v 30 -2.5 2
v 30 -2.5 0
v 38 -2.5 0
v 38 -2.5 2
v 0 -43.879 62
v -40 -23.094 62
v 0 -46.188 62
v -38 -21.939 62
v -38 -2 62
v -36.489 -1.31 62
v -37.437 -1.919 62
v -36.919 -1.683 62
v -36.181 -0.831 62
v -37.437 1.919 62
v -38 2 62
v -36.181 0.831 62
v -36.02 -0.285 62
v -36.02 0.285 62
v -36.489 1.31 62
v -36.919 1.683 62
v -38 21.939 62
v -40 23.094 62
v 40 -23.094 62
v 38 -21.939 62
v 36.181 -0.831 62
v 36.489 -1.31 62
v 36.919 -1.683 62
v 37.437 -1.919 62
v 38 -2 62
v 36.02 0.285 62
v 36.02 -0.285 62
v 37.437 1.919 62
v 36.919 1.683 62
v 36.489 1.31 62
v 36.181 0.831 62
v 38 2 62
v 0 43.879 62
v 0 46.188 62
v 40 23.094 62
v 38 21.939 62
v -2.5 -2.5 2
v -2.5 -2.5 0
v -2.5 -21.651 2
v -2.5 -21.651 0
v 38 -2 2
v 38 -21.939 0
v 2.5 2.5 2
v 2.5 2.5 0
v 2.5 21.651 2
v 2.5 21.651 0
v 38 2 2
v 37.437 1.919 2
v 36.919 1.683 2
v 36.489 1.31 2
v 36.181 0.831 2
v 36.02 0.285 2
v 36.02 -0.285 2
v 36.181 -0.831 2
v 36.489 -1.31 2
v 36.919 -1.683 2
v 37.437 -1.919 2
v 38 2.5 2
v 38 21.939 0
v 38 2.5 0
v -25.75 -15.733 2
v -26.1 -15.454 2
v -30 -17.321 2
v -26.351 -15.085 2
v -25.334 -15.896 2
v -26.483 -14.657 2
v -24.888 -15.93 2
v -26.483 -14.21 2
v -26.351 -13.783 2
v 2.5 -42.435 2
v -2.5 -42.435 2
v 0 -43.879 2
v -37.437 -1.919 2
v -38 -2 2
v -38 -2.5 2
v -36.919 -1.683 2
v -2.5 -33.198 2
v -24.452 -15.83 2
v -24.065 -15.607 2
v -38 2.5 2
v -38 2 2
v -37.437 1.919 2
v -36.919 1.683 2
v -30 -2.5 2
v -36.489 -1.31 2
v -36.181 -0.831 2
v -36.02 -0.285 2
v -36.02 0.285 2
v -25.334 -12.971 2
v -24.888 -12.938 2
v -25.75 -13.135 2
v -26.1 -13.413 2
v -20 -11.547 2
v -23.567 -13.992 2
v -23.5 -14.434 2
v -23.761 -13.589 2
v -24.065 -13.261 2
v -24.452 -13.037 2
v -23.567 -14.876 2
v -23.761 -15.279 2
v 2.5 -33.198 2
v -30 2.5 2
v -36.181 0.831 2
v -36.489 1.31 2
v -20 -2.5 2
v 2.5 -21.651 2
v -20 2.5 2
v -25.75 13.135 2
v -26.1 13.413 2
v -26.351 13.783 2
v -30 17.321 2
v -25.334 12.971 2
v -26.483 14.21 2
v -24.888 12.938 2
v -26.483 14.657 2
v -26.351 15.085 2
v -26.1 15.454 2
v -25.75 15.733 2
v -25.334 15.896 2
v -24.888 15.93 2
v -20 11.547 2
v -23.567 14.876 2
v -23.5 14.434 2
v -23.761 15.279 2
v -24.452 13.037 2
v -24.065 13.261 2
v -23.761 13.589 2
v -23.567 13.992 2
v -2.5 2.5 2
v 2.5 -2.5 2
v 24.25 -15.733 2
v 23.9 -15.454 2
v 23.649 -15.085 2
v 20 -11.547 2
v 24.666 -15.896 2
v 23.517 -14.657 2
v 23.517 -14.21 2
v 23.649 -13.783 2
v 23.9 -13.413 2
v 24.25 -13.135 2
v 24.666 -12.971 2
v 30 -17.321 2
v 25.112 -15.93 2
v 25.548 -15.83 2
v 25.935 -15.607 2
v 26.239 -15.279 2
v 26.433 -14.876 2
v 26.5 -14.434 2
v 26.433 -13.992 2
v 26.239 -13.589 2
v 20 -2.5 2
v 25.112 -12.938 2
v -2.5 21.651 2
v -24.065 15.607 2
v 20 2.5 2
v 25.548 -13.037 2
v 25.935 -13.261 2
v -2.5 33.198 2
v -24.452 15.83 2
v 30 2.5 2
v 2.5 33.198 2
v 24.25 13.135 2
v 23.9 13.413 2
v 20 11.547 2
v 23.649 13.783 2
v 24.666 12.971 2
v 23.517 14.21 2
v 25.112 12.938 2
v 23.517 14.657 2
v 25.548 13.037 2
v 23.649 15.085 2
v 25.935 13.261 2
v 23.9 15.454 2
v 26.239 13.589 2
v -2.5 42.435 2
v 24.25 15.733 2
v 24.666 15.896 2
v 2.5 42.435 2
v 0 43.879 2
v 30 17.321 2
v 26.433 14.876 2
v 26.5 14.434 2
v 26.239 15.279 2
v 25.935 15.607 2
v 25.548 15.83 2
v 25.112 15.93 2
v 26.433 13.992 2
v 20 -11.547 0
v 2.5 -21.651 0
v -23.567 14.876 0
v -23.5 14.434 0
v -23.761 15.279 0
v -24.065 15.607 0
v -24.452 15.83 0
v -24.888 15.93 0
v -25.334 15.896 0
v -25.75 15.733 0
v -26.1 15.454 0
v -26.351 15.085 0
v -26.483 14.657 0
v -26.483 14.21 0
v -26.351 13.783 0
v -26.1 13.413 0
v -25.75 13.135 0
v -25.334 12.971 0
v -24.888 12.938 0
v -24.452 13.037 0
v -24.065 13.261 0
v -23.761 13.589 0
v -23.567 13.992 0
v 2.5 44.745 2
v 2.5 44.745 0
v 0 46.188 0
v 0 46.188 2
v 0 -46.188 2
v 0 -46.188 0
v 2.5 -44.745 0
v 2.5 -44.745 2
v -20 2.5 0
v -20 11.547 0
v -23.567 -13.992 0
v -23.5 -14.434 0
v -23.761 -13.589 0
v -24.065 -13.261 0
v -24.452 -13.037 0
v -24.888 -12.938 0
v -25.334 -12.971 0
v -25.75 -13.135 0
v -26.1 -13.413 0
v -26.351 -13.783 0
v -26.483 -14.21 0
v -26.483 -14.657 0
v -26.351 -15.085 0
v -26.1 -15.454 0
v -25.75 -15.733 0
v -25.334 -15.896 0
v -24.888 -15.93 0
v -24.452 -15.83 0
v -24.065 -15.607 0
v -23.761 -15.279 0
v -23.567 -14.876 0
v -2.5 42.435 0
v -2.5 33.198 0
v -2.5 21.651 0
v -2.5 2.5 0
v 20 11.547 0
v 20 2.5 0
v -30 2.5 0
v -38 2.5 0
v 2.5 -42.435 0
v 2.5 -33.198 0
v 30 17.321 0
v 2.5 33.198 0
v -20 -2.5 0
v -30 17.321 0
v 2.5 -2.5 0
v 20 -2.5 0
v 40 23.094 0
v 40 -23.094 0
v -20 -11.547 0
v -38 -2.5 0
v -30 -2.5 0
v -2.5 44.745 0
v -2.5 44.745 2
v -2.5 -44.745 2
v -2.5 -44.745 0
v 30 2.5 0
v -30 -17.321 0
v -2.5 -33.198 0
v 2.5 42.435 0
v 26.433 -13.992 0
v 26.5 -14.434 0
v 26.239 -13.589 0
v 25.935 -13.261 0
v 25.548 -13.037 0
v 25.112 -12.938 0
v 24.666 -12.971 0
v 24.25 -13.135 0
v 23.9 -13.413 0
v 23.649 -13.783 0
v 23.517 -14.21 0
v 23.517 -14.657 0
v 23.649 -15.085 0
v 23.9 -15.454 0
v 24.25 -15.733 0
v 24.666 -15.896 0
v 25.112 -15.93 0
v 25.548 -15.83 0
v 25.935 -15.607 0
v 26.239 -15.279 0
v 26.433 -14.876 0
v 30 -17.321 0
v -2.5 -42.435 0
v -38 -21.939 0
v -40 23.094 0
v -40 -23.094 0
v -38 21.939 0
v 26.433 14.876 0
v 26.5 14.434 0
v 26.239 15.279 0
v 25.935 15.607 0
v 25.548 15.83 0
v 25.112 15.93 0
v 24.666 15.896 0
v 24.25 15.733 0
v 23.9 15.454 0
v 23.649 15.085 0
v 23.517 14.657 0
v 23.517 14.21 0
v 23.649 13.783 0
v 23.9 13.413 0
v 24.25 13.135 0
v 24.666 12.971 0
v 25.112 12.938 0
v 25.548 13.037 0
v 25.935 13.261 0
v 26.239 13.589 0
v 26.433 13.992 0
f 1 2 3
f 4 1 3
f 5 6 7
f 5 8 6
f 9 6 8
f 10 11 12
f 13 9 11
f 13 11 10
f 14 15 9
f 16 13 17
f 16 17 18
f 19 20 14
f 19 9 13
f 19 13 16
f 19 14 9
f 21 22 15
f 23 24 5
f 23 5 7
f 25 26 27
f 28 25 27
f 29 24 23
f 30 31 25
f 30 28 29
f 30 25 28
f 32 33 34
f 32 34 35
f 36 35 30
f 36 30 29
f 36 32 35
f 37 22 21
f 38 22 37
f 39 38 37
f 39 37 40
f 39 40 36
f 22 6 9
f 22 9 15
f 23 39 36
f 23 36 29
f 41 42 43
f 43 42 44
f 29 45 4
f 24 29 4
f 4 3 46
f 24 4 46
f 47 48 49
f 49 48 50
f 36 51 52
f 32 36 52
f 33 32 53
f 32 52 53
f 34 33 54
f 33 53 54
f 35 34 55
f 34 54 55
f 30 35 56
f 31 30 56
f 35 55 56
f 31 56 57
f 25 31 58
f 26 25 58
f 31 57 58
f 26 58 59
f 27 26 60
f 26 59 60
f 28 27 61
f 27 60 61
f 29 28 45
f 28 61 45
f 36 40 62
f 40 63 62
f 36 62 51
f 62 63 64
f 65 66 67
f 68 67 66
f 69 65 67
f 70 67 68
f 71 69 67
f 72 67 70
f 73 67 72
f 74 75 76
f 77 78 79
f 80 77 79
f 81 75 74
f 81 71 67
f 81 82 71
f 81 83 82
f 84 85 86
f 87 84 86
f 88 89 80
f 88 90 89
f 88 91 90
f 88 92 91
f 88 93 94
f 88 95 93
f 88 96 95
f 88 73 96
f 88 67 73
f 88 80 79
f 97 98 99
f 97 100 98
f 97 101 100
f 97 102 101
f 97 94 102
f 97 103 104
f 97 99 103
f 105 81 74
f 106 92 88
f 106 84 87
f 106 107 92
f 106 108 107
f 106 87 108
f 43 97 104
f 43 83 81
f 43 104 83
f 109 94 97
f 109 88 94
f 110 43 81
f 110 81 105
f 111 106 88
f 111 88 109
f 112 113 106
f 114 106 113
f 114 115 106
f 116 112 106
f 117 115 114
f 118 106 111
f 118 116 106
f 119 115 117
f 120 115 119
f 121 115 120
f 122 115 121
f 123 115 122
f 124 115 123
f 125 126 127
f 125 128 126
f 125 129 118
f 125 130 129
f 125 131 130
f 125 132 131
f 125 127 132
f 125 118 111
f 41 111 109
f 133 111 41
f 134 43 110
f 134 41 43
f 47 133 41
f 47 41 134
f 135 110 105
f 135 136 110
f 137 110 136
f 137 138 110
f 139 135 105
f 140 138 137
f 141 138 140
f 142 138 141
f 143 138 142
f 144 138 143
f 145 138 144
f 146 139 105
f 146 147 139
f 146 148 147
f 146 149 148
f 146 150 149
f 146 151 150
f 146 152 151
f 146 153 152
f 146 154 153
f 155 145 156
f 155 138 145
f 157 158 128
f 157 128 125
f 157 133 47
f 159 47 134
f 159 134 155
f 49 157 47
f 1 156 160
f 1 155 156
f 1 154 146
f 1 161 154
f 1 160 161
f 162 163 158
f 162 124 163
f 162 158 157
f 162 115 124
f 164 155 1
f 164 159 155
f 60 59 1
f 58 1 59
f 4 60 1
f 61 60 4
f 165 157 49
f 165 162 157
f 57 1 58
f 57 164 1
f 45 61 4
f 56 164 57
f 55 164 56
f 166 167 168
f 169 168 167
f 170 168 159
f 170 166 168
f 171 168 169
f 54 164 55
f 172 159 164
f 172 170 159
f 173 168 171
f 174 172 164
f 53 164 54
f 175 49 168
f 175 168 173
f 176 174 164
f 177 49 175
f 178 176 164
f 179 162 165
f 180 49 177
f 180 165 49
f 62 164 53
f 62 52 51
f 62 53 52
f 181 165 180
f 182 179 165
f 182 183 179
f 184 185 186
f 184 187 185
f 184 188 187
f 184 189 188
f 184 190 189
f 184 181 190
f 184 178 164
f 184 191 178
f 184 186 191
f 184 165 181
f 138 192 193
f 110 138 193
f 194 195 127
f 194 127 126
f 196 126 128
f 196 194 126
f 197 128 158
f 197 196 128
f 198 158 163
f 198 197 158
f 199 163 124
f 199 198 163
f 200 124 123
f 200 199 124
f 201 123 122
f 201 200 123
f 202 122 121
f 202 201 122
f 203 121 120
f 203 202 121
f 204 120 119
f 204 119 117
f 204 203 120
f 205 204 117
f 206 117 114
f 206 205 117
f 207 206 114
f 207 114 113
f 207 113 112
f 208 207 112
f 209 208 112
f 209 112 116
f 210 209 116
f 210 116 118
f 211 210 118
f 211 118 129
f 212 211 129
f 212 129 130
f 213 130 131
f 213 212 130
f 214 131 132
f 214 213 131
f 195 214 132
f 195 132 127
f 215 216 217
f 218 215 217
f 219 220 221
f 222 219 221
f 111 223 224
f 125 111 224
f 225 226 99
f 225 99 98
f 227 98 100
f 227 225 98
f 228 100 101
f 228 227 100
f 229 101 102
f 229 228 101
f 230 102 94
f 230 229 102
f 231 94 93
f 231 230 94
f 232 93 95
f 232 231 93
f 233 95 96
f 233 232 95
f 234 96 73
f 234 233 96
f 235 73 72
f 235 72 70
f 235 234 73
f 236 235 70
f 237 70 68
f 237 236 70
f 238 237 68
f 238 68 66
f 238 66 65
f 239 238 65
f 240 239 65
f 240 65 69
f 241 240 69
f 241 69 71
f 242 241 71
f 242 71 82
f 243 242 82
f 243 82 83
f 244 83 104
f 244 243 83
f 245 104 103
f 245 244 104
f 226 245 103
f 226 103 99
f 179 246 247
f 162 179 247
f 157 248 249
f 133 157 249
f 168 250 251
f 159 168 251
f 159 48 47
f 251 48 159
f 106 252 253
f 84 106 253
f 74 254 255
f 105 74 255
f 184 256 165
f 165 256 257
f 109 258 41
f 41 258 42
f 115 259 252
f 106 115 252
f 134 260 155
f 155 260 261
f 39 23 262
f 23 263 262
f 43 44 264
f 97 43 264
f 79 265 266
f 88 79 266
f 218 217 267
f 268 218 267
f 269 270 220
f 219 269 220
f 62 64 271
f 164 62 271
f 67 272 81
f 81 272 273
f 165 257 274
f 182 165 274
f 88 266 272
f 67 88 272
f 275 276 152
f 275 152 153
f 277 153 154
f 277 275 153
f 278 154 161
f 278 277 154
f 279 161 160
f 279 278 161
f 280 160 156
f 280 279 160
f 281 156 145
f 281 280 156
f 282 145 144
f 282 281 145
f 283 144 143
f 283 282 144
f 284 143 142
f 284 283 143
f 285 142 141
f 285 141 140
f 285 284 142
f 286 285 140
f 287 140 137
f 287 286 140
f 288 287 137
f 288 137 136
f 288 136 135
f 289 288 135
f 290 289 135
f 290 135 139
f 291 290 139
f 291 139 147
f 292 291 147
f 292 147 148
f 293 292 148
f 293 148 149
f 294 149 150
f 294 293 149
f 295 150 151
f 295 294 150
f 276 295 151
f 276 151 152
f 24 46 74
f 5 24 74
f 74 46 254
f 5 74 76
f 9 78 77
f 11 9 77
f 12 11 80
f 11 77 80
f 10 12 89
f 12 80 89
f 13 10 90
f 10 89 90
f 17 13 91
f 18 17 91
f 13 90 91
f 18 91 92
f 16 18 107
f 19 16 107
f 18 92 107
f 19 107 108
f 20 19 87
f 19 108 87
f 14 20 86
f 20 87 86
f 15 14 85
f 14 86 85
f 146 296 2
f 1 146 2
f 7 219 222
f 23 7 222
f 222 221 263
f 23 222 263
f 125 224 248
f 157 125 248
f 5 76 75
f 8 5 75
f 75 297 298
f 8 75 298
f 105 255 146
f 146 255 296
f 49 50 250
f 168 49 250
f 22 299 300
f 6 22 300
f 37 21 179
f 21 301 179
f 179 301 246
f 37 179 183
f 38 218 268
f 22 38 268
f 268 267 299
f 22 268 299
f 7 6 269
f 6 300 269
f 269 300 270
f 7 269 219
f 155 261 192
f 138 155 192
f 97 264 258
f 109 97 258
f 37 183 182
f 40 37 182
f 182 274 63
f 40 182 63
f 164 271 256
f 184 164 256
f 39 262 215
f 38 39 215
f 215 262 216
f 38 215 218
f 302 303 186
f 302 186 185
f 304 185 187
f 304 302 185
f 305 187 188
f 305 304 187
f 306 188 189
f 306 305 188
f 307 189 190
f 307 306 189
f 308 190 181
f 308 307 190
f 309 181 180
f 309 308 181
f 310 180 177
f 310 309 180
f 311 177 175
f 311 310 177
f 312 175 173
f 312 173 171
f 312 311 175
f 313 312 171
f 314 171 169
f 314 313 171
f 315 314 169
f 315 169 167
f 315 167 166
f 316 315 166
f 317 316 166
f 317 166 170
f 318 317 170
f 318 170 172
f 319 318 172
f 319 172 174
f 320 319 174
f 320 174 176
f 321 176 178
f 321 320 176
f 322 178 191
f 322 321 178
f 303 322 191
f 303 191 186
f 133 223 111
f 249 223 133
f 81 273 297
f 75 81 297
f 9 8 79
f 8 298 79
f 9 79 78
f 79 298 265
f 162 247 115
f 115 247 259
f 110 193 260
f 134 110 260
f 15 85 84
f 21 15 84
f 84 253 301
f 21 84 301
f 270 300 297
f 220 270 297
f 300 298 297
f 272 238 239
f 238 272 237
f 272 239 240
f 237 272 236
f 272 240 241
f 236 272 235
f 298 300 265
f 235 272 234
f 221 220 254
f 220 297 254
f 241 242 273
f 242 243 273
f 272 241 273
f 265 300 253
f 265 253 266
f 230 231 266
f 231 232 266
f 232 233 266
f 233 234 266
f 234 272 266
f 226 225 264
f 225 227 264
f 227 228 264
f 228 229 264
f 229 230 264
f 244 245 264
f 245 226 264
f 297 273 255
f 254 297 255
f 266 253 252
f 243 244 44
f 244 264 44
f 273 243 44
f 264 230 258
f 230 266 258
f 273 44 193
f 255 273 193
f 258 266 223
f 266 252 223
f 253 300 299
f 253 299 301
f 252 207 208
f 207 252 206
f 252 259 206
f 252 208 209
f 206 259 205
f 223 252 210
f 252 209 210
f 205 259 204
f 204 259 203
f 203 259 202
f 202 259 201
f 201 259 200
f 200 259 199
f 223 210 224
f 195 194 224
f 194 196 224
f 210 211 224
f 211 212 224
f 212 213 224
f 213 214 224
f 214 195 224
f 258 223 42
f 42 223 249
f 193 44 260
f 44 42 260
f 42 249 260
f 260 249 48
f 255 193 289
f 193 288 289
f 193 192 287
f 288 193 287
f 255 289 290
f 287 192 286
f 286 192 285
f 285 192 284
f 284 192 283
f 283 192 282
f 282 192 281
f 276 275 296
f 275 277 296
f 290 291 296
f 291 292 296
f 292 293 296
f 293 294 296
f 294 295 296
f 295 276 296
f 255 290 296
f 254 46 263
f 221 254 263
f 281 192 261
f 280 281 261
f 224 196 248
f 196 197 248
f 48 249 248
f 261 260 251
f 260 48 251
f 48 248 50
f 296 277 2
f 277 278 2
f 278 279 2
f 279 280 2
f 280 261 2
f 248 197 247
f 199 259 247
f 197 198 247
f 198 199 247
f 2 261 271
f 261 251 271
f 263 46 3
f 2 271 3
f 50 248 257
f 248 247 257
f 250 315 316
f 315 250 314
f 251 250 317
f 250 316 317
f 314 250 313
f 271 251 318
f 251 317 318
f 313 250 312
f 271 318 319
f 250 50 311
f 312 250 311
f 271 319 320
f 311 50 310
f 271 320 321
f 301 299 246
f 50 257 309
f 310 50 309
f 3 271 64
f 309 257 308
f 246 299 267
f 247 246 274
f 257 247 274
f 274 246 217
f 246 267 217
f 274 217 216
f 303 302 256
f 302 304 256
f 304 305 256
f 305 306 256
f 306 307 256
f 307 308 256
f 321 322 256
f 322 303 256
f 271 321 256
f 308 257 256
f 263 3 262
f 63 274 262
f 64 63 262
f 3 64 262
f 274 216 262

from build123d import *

# Parameters (mm, degrees)
F0_R     = 1.5
F0_W     = 10
F0_H     = 5
F0_W_2   = 17.5
F0_W_3   = 5
F1_DEPTH = 2
F3_DEPTH = 60


with BuildPart() as f1:
    # F0 (on Top) → F1 (new body)
    with BuildSketch(Plane.XY):
        Polygon((0, -46.1880215352), (2.5, -44.7446458622), (-2.5, -44.7446458622), align=None)
        Polygon((-2.5, 44.7446458622), (2.5, 44.7446458622), (0, 46.1880215352), align=None)
        Polygon((-2.5, -44.7446458622), (2.5, -44.7446458622), (2.5, -42.4352447854), (0, -43.8786204584), (-2.5, -42.4352447854), align=None)
        Polygon((2.5, 42.4352447854), (2.5, 44.7446458622), (-2.5, 44.7446458622), (-2.5, 42.4352447854), (0, 43.8786204584), align=None)
        Polygon((40, -23.0940107676), (40, 23.0940107676), (2.5, 44.7446458622), (2.5, 42.4352447854), (38, 21.9393102292), (38, 2.5), (38, 2), (38, -2), (38, -2.5), (38, -21.9393102292), (2.5, -42.4352447854), (2.5, -44.7446458622), align=None)
        Polygon((-2.5, 42.4352447854), (-2.5, 44.7446458622), (-40, 23.0940107676), (-40, -23.0940107676), (-2.5, -44.7446458622), (-2.5, -42.4352447854), (-38, -21.9393102292), (-38, -2.5), (-38, -2), (-38, 2), (-38, 2.5), (-38, 21.9393102292), align=None)
        Polygon((-2.5, 21.6506350946), (-2.5, 33.1976404784), (-30, 17.3205080757), (-30, 2.5), (-20, 2.5), (-20, 11.5470053838), align=None)
        with Locations((-25, 14.4337567297)):
            Circle(F0_R, mode=Mode.SUBTRACT)
        Polygon((30, 17.3205080757), (2.5, 33.1976404784), (2.5, 21.6506350946), (20, 11.5470053838), (20, 2.5), (30, 2.5), align=None)
        with Locations((25, 14.4337567297)):
            Circle(F0_R, mode=Mode.SUBTRACT)
        Polygon((2.5, 21.6506350946), (2.5, 33.1976404784), (0, 34.6410161514), (-2.5, 33.1976404784), (-2.5, 21.6506350946), (0, 23.0940107676), align=None)
        Polygon((2.5, 33.1976404784), (2.5, 42.4352447854), (0, 43.8786204584), (-2.5, 42.4352447854), (-2.5, 33.1976404784), (0, 34.6410161514), align=None)
        Polygon((-30, -17.3205080757), (-2.5, -33.1976404784), (-2.5, -21.6506350946), (-20, -11.5470053838), (-20, -2.5), (-30, -2.5), align=None)
        with Locations((-25, -14.4337567297)):
            Circle(F0_R, mode=Mode.SUBTRACT)
        Polygon((0, -34.6410161514), (2.5, -33.1976404784), (2.5, -21.6506350946), (0, -23.0940107676), (-2.5, -21.6506350946), (-2.5, -33.1976404784), align=None)
        Polygon((2.5, -21.6506350946), (2.5, -33.1976404784), (30, -17.3205080757), (30, -2.5), (20, -2.5), (20, -11.5470053838), align=None)
        with Locations((25, -14.4337567297)):
            Circle(F0_R, mode=Mode.SUBTRACT)
        with Locations((25, 0)):
            Rectangle(F0_W, F0_H)
        with BuildLine():
            Line((38, 2), (38, 2.5))
            Line((38, 2.5), (30, 2.5))
            Line((30, 2.5), (30, -2.5))
            Line((30, -2.5), (38, -2.5))
            Line((38, -2.5), (38, -2))
            ThreePointArc((38, -2), (36, 0), (38, 2))
        make_face()
        with Locations((11.25, 0)):
            Rectangle(F0_W_2, F0_H)
        Polygon((2.5, 2.5), (2.5, 21.6506350946), (0, 23.0940107676), (-2.5, 21.6506350946), (-2.5, 2.5), align=None)
        with Locations((-11.25, 0)):
            Rectangle(F0_W_2, F0_H)
        with Locations((-25, 0)):
            Rectangle(F0_W, F0_H)
        with BuildLine():
            Line((-30, 2.5), (-38, 2.5))
            Line((-38, 2.5), (-38, 2))
            ThreePointArc((-38, 2), (-36, 0), (-38, -2))
            Line((-38, -2), (-38, -2.5))
            Line((-38, -2.5), (-30, -2.5))
            Line((-30, -2.5), (-30, 2.5))
        make_face()
        Polygon((0, -23.0940107676), (2.5, -21.6506350946), (2.5, -2.5), (-2.5, -2.5), (-2.5, -21.6506350946), align=None)
        Rectangle(F0_W_3, F0_H)
        Polygon((0, -43.8786204584), (2.5, -42.4352447854), (2.5, -33.1976404784), (0, -34.6410161514), (-2.5, -33.1976404784), (-2.5, -42.4352447854), align=None)
        with BuildLine():
            ThreePointArc((-38, -2), (-36, 0), (-38, 2))
            Line((-38, 2), (-38, -2))
        make_face()
        with BuildLine():
            Line((38, -2), (38, 2))
            ThreePointArc((38, 2), (36, 0), (38, -2))
        make_face()
    extrude(amount=F1_DEPTH)

    # F2 (on face) → F3 (join)
    with BuildSketch(Plane.XY.offset(2)):
        Polygon((-40, 23.0940107676), (-40, -23.0940107676), (0, -46.1880215352), (40, -23.0940107676), (40, 23.0940107676), (0, 46.1880215352), align=None)
        Polygon((0, -43.8786204584), (-38, -21.9393102292), (-38, -2), (-38, 2), (-38, 21.9393102292), (0, 43.8786204584), (38, 21.9393102292), (38, 2), (38, -2), (38, -21.9393102292), align=None, mode=Mode.SUBTRACT)
        with BuildLine():
            Line((-38, 2), (-38, -2))
            ThreePointArc((-38, -2), (-36, 0), (-38, 2))
        make_face()
        with BuildLine():
            ThreePointArc((38, 2), (36, 0), (38, -2))
            Line((38, -2), (38, 2))
        make_face()
    extrude(amount=F3_DEPTH)


solid = f1.part
